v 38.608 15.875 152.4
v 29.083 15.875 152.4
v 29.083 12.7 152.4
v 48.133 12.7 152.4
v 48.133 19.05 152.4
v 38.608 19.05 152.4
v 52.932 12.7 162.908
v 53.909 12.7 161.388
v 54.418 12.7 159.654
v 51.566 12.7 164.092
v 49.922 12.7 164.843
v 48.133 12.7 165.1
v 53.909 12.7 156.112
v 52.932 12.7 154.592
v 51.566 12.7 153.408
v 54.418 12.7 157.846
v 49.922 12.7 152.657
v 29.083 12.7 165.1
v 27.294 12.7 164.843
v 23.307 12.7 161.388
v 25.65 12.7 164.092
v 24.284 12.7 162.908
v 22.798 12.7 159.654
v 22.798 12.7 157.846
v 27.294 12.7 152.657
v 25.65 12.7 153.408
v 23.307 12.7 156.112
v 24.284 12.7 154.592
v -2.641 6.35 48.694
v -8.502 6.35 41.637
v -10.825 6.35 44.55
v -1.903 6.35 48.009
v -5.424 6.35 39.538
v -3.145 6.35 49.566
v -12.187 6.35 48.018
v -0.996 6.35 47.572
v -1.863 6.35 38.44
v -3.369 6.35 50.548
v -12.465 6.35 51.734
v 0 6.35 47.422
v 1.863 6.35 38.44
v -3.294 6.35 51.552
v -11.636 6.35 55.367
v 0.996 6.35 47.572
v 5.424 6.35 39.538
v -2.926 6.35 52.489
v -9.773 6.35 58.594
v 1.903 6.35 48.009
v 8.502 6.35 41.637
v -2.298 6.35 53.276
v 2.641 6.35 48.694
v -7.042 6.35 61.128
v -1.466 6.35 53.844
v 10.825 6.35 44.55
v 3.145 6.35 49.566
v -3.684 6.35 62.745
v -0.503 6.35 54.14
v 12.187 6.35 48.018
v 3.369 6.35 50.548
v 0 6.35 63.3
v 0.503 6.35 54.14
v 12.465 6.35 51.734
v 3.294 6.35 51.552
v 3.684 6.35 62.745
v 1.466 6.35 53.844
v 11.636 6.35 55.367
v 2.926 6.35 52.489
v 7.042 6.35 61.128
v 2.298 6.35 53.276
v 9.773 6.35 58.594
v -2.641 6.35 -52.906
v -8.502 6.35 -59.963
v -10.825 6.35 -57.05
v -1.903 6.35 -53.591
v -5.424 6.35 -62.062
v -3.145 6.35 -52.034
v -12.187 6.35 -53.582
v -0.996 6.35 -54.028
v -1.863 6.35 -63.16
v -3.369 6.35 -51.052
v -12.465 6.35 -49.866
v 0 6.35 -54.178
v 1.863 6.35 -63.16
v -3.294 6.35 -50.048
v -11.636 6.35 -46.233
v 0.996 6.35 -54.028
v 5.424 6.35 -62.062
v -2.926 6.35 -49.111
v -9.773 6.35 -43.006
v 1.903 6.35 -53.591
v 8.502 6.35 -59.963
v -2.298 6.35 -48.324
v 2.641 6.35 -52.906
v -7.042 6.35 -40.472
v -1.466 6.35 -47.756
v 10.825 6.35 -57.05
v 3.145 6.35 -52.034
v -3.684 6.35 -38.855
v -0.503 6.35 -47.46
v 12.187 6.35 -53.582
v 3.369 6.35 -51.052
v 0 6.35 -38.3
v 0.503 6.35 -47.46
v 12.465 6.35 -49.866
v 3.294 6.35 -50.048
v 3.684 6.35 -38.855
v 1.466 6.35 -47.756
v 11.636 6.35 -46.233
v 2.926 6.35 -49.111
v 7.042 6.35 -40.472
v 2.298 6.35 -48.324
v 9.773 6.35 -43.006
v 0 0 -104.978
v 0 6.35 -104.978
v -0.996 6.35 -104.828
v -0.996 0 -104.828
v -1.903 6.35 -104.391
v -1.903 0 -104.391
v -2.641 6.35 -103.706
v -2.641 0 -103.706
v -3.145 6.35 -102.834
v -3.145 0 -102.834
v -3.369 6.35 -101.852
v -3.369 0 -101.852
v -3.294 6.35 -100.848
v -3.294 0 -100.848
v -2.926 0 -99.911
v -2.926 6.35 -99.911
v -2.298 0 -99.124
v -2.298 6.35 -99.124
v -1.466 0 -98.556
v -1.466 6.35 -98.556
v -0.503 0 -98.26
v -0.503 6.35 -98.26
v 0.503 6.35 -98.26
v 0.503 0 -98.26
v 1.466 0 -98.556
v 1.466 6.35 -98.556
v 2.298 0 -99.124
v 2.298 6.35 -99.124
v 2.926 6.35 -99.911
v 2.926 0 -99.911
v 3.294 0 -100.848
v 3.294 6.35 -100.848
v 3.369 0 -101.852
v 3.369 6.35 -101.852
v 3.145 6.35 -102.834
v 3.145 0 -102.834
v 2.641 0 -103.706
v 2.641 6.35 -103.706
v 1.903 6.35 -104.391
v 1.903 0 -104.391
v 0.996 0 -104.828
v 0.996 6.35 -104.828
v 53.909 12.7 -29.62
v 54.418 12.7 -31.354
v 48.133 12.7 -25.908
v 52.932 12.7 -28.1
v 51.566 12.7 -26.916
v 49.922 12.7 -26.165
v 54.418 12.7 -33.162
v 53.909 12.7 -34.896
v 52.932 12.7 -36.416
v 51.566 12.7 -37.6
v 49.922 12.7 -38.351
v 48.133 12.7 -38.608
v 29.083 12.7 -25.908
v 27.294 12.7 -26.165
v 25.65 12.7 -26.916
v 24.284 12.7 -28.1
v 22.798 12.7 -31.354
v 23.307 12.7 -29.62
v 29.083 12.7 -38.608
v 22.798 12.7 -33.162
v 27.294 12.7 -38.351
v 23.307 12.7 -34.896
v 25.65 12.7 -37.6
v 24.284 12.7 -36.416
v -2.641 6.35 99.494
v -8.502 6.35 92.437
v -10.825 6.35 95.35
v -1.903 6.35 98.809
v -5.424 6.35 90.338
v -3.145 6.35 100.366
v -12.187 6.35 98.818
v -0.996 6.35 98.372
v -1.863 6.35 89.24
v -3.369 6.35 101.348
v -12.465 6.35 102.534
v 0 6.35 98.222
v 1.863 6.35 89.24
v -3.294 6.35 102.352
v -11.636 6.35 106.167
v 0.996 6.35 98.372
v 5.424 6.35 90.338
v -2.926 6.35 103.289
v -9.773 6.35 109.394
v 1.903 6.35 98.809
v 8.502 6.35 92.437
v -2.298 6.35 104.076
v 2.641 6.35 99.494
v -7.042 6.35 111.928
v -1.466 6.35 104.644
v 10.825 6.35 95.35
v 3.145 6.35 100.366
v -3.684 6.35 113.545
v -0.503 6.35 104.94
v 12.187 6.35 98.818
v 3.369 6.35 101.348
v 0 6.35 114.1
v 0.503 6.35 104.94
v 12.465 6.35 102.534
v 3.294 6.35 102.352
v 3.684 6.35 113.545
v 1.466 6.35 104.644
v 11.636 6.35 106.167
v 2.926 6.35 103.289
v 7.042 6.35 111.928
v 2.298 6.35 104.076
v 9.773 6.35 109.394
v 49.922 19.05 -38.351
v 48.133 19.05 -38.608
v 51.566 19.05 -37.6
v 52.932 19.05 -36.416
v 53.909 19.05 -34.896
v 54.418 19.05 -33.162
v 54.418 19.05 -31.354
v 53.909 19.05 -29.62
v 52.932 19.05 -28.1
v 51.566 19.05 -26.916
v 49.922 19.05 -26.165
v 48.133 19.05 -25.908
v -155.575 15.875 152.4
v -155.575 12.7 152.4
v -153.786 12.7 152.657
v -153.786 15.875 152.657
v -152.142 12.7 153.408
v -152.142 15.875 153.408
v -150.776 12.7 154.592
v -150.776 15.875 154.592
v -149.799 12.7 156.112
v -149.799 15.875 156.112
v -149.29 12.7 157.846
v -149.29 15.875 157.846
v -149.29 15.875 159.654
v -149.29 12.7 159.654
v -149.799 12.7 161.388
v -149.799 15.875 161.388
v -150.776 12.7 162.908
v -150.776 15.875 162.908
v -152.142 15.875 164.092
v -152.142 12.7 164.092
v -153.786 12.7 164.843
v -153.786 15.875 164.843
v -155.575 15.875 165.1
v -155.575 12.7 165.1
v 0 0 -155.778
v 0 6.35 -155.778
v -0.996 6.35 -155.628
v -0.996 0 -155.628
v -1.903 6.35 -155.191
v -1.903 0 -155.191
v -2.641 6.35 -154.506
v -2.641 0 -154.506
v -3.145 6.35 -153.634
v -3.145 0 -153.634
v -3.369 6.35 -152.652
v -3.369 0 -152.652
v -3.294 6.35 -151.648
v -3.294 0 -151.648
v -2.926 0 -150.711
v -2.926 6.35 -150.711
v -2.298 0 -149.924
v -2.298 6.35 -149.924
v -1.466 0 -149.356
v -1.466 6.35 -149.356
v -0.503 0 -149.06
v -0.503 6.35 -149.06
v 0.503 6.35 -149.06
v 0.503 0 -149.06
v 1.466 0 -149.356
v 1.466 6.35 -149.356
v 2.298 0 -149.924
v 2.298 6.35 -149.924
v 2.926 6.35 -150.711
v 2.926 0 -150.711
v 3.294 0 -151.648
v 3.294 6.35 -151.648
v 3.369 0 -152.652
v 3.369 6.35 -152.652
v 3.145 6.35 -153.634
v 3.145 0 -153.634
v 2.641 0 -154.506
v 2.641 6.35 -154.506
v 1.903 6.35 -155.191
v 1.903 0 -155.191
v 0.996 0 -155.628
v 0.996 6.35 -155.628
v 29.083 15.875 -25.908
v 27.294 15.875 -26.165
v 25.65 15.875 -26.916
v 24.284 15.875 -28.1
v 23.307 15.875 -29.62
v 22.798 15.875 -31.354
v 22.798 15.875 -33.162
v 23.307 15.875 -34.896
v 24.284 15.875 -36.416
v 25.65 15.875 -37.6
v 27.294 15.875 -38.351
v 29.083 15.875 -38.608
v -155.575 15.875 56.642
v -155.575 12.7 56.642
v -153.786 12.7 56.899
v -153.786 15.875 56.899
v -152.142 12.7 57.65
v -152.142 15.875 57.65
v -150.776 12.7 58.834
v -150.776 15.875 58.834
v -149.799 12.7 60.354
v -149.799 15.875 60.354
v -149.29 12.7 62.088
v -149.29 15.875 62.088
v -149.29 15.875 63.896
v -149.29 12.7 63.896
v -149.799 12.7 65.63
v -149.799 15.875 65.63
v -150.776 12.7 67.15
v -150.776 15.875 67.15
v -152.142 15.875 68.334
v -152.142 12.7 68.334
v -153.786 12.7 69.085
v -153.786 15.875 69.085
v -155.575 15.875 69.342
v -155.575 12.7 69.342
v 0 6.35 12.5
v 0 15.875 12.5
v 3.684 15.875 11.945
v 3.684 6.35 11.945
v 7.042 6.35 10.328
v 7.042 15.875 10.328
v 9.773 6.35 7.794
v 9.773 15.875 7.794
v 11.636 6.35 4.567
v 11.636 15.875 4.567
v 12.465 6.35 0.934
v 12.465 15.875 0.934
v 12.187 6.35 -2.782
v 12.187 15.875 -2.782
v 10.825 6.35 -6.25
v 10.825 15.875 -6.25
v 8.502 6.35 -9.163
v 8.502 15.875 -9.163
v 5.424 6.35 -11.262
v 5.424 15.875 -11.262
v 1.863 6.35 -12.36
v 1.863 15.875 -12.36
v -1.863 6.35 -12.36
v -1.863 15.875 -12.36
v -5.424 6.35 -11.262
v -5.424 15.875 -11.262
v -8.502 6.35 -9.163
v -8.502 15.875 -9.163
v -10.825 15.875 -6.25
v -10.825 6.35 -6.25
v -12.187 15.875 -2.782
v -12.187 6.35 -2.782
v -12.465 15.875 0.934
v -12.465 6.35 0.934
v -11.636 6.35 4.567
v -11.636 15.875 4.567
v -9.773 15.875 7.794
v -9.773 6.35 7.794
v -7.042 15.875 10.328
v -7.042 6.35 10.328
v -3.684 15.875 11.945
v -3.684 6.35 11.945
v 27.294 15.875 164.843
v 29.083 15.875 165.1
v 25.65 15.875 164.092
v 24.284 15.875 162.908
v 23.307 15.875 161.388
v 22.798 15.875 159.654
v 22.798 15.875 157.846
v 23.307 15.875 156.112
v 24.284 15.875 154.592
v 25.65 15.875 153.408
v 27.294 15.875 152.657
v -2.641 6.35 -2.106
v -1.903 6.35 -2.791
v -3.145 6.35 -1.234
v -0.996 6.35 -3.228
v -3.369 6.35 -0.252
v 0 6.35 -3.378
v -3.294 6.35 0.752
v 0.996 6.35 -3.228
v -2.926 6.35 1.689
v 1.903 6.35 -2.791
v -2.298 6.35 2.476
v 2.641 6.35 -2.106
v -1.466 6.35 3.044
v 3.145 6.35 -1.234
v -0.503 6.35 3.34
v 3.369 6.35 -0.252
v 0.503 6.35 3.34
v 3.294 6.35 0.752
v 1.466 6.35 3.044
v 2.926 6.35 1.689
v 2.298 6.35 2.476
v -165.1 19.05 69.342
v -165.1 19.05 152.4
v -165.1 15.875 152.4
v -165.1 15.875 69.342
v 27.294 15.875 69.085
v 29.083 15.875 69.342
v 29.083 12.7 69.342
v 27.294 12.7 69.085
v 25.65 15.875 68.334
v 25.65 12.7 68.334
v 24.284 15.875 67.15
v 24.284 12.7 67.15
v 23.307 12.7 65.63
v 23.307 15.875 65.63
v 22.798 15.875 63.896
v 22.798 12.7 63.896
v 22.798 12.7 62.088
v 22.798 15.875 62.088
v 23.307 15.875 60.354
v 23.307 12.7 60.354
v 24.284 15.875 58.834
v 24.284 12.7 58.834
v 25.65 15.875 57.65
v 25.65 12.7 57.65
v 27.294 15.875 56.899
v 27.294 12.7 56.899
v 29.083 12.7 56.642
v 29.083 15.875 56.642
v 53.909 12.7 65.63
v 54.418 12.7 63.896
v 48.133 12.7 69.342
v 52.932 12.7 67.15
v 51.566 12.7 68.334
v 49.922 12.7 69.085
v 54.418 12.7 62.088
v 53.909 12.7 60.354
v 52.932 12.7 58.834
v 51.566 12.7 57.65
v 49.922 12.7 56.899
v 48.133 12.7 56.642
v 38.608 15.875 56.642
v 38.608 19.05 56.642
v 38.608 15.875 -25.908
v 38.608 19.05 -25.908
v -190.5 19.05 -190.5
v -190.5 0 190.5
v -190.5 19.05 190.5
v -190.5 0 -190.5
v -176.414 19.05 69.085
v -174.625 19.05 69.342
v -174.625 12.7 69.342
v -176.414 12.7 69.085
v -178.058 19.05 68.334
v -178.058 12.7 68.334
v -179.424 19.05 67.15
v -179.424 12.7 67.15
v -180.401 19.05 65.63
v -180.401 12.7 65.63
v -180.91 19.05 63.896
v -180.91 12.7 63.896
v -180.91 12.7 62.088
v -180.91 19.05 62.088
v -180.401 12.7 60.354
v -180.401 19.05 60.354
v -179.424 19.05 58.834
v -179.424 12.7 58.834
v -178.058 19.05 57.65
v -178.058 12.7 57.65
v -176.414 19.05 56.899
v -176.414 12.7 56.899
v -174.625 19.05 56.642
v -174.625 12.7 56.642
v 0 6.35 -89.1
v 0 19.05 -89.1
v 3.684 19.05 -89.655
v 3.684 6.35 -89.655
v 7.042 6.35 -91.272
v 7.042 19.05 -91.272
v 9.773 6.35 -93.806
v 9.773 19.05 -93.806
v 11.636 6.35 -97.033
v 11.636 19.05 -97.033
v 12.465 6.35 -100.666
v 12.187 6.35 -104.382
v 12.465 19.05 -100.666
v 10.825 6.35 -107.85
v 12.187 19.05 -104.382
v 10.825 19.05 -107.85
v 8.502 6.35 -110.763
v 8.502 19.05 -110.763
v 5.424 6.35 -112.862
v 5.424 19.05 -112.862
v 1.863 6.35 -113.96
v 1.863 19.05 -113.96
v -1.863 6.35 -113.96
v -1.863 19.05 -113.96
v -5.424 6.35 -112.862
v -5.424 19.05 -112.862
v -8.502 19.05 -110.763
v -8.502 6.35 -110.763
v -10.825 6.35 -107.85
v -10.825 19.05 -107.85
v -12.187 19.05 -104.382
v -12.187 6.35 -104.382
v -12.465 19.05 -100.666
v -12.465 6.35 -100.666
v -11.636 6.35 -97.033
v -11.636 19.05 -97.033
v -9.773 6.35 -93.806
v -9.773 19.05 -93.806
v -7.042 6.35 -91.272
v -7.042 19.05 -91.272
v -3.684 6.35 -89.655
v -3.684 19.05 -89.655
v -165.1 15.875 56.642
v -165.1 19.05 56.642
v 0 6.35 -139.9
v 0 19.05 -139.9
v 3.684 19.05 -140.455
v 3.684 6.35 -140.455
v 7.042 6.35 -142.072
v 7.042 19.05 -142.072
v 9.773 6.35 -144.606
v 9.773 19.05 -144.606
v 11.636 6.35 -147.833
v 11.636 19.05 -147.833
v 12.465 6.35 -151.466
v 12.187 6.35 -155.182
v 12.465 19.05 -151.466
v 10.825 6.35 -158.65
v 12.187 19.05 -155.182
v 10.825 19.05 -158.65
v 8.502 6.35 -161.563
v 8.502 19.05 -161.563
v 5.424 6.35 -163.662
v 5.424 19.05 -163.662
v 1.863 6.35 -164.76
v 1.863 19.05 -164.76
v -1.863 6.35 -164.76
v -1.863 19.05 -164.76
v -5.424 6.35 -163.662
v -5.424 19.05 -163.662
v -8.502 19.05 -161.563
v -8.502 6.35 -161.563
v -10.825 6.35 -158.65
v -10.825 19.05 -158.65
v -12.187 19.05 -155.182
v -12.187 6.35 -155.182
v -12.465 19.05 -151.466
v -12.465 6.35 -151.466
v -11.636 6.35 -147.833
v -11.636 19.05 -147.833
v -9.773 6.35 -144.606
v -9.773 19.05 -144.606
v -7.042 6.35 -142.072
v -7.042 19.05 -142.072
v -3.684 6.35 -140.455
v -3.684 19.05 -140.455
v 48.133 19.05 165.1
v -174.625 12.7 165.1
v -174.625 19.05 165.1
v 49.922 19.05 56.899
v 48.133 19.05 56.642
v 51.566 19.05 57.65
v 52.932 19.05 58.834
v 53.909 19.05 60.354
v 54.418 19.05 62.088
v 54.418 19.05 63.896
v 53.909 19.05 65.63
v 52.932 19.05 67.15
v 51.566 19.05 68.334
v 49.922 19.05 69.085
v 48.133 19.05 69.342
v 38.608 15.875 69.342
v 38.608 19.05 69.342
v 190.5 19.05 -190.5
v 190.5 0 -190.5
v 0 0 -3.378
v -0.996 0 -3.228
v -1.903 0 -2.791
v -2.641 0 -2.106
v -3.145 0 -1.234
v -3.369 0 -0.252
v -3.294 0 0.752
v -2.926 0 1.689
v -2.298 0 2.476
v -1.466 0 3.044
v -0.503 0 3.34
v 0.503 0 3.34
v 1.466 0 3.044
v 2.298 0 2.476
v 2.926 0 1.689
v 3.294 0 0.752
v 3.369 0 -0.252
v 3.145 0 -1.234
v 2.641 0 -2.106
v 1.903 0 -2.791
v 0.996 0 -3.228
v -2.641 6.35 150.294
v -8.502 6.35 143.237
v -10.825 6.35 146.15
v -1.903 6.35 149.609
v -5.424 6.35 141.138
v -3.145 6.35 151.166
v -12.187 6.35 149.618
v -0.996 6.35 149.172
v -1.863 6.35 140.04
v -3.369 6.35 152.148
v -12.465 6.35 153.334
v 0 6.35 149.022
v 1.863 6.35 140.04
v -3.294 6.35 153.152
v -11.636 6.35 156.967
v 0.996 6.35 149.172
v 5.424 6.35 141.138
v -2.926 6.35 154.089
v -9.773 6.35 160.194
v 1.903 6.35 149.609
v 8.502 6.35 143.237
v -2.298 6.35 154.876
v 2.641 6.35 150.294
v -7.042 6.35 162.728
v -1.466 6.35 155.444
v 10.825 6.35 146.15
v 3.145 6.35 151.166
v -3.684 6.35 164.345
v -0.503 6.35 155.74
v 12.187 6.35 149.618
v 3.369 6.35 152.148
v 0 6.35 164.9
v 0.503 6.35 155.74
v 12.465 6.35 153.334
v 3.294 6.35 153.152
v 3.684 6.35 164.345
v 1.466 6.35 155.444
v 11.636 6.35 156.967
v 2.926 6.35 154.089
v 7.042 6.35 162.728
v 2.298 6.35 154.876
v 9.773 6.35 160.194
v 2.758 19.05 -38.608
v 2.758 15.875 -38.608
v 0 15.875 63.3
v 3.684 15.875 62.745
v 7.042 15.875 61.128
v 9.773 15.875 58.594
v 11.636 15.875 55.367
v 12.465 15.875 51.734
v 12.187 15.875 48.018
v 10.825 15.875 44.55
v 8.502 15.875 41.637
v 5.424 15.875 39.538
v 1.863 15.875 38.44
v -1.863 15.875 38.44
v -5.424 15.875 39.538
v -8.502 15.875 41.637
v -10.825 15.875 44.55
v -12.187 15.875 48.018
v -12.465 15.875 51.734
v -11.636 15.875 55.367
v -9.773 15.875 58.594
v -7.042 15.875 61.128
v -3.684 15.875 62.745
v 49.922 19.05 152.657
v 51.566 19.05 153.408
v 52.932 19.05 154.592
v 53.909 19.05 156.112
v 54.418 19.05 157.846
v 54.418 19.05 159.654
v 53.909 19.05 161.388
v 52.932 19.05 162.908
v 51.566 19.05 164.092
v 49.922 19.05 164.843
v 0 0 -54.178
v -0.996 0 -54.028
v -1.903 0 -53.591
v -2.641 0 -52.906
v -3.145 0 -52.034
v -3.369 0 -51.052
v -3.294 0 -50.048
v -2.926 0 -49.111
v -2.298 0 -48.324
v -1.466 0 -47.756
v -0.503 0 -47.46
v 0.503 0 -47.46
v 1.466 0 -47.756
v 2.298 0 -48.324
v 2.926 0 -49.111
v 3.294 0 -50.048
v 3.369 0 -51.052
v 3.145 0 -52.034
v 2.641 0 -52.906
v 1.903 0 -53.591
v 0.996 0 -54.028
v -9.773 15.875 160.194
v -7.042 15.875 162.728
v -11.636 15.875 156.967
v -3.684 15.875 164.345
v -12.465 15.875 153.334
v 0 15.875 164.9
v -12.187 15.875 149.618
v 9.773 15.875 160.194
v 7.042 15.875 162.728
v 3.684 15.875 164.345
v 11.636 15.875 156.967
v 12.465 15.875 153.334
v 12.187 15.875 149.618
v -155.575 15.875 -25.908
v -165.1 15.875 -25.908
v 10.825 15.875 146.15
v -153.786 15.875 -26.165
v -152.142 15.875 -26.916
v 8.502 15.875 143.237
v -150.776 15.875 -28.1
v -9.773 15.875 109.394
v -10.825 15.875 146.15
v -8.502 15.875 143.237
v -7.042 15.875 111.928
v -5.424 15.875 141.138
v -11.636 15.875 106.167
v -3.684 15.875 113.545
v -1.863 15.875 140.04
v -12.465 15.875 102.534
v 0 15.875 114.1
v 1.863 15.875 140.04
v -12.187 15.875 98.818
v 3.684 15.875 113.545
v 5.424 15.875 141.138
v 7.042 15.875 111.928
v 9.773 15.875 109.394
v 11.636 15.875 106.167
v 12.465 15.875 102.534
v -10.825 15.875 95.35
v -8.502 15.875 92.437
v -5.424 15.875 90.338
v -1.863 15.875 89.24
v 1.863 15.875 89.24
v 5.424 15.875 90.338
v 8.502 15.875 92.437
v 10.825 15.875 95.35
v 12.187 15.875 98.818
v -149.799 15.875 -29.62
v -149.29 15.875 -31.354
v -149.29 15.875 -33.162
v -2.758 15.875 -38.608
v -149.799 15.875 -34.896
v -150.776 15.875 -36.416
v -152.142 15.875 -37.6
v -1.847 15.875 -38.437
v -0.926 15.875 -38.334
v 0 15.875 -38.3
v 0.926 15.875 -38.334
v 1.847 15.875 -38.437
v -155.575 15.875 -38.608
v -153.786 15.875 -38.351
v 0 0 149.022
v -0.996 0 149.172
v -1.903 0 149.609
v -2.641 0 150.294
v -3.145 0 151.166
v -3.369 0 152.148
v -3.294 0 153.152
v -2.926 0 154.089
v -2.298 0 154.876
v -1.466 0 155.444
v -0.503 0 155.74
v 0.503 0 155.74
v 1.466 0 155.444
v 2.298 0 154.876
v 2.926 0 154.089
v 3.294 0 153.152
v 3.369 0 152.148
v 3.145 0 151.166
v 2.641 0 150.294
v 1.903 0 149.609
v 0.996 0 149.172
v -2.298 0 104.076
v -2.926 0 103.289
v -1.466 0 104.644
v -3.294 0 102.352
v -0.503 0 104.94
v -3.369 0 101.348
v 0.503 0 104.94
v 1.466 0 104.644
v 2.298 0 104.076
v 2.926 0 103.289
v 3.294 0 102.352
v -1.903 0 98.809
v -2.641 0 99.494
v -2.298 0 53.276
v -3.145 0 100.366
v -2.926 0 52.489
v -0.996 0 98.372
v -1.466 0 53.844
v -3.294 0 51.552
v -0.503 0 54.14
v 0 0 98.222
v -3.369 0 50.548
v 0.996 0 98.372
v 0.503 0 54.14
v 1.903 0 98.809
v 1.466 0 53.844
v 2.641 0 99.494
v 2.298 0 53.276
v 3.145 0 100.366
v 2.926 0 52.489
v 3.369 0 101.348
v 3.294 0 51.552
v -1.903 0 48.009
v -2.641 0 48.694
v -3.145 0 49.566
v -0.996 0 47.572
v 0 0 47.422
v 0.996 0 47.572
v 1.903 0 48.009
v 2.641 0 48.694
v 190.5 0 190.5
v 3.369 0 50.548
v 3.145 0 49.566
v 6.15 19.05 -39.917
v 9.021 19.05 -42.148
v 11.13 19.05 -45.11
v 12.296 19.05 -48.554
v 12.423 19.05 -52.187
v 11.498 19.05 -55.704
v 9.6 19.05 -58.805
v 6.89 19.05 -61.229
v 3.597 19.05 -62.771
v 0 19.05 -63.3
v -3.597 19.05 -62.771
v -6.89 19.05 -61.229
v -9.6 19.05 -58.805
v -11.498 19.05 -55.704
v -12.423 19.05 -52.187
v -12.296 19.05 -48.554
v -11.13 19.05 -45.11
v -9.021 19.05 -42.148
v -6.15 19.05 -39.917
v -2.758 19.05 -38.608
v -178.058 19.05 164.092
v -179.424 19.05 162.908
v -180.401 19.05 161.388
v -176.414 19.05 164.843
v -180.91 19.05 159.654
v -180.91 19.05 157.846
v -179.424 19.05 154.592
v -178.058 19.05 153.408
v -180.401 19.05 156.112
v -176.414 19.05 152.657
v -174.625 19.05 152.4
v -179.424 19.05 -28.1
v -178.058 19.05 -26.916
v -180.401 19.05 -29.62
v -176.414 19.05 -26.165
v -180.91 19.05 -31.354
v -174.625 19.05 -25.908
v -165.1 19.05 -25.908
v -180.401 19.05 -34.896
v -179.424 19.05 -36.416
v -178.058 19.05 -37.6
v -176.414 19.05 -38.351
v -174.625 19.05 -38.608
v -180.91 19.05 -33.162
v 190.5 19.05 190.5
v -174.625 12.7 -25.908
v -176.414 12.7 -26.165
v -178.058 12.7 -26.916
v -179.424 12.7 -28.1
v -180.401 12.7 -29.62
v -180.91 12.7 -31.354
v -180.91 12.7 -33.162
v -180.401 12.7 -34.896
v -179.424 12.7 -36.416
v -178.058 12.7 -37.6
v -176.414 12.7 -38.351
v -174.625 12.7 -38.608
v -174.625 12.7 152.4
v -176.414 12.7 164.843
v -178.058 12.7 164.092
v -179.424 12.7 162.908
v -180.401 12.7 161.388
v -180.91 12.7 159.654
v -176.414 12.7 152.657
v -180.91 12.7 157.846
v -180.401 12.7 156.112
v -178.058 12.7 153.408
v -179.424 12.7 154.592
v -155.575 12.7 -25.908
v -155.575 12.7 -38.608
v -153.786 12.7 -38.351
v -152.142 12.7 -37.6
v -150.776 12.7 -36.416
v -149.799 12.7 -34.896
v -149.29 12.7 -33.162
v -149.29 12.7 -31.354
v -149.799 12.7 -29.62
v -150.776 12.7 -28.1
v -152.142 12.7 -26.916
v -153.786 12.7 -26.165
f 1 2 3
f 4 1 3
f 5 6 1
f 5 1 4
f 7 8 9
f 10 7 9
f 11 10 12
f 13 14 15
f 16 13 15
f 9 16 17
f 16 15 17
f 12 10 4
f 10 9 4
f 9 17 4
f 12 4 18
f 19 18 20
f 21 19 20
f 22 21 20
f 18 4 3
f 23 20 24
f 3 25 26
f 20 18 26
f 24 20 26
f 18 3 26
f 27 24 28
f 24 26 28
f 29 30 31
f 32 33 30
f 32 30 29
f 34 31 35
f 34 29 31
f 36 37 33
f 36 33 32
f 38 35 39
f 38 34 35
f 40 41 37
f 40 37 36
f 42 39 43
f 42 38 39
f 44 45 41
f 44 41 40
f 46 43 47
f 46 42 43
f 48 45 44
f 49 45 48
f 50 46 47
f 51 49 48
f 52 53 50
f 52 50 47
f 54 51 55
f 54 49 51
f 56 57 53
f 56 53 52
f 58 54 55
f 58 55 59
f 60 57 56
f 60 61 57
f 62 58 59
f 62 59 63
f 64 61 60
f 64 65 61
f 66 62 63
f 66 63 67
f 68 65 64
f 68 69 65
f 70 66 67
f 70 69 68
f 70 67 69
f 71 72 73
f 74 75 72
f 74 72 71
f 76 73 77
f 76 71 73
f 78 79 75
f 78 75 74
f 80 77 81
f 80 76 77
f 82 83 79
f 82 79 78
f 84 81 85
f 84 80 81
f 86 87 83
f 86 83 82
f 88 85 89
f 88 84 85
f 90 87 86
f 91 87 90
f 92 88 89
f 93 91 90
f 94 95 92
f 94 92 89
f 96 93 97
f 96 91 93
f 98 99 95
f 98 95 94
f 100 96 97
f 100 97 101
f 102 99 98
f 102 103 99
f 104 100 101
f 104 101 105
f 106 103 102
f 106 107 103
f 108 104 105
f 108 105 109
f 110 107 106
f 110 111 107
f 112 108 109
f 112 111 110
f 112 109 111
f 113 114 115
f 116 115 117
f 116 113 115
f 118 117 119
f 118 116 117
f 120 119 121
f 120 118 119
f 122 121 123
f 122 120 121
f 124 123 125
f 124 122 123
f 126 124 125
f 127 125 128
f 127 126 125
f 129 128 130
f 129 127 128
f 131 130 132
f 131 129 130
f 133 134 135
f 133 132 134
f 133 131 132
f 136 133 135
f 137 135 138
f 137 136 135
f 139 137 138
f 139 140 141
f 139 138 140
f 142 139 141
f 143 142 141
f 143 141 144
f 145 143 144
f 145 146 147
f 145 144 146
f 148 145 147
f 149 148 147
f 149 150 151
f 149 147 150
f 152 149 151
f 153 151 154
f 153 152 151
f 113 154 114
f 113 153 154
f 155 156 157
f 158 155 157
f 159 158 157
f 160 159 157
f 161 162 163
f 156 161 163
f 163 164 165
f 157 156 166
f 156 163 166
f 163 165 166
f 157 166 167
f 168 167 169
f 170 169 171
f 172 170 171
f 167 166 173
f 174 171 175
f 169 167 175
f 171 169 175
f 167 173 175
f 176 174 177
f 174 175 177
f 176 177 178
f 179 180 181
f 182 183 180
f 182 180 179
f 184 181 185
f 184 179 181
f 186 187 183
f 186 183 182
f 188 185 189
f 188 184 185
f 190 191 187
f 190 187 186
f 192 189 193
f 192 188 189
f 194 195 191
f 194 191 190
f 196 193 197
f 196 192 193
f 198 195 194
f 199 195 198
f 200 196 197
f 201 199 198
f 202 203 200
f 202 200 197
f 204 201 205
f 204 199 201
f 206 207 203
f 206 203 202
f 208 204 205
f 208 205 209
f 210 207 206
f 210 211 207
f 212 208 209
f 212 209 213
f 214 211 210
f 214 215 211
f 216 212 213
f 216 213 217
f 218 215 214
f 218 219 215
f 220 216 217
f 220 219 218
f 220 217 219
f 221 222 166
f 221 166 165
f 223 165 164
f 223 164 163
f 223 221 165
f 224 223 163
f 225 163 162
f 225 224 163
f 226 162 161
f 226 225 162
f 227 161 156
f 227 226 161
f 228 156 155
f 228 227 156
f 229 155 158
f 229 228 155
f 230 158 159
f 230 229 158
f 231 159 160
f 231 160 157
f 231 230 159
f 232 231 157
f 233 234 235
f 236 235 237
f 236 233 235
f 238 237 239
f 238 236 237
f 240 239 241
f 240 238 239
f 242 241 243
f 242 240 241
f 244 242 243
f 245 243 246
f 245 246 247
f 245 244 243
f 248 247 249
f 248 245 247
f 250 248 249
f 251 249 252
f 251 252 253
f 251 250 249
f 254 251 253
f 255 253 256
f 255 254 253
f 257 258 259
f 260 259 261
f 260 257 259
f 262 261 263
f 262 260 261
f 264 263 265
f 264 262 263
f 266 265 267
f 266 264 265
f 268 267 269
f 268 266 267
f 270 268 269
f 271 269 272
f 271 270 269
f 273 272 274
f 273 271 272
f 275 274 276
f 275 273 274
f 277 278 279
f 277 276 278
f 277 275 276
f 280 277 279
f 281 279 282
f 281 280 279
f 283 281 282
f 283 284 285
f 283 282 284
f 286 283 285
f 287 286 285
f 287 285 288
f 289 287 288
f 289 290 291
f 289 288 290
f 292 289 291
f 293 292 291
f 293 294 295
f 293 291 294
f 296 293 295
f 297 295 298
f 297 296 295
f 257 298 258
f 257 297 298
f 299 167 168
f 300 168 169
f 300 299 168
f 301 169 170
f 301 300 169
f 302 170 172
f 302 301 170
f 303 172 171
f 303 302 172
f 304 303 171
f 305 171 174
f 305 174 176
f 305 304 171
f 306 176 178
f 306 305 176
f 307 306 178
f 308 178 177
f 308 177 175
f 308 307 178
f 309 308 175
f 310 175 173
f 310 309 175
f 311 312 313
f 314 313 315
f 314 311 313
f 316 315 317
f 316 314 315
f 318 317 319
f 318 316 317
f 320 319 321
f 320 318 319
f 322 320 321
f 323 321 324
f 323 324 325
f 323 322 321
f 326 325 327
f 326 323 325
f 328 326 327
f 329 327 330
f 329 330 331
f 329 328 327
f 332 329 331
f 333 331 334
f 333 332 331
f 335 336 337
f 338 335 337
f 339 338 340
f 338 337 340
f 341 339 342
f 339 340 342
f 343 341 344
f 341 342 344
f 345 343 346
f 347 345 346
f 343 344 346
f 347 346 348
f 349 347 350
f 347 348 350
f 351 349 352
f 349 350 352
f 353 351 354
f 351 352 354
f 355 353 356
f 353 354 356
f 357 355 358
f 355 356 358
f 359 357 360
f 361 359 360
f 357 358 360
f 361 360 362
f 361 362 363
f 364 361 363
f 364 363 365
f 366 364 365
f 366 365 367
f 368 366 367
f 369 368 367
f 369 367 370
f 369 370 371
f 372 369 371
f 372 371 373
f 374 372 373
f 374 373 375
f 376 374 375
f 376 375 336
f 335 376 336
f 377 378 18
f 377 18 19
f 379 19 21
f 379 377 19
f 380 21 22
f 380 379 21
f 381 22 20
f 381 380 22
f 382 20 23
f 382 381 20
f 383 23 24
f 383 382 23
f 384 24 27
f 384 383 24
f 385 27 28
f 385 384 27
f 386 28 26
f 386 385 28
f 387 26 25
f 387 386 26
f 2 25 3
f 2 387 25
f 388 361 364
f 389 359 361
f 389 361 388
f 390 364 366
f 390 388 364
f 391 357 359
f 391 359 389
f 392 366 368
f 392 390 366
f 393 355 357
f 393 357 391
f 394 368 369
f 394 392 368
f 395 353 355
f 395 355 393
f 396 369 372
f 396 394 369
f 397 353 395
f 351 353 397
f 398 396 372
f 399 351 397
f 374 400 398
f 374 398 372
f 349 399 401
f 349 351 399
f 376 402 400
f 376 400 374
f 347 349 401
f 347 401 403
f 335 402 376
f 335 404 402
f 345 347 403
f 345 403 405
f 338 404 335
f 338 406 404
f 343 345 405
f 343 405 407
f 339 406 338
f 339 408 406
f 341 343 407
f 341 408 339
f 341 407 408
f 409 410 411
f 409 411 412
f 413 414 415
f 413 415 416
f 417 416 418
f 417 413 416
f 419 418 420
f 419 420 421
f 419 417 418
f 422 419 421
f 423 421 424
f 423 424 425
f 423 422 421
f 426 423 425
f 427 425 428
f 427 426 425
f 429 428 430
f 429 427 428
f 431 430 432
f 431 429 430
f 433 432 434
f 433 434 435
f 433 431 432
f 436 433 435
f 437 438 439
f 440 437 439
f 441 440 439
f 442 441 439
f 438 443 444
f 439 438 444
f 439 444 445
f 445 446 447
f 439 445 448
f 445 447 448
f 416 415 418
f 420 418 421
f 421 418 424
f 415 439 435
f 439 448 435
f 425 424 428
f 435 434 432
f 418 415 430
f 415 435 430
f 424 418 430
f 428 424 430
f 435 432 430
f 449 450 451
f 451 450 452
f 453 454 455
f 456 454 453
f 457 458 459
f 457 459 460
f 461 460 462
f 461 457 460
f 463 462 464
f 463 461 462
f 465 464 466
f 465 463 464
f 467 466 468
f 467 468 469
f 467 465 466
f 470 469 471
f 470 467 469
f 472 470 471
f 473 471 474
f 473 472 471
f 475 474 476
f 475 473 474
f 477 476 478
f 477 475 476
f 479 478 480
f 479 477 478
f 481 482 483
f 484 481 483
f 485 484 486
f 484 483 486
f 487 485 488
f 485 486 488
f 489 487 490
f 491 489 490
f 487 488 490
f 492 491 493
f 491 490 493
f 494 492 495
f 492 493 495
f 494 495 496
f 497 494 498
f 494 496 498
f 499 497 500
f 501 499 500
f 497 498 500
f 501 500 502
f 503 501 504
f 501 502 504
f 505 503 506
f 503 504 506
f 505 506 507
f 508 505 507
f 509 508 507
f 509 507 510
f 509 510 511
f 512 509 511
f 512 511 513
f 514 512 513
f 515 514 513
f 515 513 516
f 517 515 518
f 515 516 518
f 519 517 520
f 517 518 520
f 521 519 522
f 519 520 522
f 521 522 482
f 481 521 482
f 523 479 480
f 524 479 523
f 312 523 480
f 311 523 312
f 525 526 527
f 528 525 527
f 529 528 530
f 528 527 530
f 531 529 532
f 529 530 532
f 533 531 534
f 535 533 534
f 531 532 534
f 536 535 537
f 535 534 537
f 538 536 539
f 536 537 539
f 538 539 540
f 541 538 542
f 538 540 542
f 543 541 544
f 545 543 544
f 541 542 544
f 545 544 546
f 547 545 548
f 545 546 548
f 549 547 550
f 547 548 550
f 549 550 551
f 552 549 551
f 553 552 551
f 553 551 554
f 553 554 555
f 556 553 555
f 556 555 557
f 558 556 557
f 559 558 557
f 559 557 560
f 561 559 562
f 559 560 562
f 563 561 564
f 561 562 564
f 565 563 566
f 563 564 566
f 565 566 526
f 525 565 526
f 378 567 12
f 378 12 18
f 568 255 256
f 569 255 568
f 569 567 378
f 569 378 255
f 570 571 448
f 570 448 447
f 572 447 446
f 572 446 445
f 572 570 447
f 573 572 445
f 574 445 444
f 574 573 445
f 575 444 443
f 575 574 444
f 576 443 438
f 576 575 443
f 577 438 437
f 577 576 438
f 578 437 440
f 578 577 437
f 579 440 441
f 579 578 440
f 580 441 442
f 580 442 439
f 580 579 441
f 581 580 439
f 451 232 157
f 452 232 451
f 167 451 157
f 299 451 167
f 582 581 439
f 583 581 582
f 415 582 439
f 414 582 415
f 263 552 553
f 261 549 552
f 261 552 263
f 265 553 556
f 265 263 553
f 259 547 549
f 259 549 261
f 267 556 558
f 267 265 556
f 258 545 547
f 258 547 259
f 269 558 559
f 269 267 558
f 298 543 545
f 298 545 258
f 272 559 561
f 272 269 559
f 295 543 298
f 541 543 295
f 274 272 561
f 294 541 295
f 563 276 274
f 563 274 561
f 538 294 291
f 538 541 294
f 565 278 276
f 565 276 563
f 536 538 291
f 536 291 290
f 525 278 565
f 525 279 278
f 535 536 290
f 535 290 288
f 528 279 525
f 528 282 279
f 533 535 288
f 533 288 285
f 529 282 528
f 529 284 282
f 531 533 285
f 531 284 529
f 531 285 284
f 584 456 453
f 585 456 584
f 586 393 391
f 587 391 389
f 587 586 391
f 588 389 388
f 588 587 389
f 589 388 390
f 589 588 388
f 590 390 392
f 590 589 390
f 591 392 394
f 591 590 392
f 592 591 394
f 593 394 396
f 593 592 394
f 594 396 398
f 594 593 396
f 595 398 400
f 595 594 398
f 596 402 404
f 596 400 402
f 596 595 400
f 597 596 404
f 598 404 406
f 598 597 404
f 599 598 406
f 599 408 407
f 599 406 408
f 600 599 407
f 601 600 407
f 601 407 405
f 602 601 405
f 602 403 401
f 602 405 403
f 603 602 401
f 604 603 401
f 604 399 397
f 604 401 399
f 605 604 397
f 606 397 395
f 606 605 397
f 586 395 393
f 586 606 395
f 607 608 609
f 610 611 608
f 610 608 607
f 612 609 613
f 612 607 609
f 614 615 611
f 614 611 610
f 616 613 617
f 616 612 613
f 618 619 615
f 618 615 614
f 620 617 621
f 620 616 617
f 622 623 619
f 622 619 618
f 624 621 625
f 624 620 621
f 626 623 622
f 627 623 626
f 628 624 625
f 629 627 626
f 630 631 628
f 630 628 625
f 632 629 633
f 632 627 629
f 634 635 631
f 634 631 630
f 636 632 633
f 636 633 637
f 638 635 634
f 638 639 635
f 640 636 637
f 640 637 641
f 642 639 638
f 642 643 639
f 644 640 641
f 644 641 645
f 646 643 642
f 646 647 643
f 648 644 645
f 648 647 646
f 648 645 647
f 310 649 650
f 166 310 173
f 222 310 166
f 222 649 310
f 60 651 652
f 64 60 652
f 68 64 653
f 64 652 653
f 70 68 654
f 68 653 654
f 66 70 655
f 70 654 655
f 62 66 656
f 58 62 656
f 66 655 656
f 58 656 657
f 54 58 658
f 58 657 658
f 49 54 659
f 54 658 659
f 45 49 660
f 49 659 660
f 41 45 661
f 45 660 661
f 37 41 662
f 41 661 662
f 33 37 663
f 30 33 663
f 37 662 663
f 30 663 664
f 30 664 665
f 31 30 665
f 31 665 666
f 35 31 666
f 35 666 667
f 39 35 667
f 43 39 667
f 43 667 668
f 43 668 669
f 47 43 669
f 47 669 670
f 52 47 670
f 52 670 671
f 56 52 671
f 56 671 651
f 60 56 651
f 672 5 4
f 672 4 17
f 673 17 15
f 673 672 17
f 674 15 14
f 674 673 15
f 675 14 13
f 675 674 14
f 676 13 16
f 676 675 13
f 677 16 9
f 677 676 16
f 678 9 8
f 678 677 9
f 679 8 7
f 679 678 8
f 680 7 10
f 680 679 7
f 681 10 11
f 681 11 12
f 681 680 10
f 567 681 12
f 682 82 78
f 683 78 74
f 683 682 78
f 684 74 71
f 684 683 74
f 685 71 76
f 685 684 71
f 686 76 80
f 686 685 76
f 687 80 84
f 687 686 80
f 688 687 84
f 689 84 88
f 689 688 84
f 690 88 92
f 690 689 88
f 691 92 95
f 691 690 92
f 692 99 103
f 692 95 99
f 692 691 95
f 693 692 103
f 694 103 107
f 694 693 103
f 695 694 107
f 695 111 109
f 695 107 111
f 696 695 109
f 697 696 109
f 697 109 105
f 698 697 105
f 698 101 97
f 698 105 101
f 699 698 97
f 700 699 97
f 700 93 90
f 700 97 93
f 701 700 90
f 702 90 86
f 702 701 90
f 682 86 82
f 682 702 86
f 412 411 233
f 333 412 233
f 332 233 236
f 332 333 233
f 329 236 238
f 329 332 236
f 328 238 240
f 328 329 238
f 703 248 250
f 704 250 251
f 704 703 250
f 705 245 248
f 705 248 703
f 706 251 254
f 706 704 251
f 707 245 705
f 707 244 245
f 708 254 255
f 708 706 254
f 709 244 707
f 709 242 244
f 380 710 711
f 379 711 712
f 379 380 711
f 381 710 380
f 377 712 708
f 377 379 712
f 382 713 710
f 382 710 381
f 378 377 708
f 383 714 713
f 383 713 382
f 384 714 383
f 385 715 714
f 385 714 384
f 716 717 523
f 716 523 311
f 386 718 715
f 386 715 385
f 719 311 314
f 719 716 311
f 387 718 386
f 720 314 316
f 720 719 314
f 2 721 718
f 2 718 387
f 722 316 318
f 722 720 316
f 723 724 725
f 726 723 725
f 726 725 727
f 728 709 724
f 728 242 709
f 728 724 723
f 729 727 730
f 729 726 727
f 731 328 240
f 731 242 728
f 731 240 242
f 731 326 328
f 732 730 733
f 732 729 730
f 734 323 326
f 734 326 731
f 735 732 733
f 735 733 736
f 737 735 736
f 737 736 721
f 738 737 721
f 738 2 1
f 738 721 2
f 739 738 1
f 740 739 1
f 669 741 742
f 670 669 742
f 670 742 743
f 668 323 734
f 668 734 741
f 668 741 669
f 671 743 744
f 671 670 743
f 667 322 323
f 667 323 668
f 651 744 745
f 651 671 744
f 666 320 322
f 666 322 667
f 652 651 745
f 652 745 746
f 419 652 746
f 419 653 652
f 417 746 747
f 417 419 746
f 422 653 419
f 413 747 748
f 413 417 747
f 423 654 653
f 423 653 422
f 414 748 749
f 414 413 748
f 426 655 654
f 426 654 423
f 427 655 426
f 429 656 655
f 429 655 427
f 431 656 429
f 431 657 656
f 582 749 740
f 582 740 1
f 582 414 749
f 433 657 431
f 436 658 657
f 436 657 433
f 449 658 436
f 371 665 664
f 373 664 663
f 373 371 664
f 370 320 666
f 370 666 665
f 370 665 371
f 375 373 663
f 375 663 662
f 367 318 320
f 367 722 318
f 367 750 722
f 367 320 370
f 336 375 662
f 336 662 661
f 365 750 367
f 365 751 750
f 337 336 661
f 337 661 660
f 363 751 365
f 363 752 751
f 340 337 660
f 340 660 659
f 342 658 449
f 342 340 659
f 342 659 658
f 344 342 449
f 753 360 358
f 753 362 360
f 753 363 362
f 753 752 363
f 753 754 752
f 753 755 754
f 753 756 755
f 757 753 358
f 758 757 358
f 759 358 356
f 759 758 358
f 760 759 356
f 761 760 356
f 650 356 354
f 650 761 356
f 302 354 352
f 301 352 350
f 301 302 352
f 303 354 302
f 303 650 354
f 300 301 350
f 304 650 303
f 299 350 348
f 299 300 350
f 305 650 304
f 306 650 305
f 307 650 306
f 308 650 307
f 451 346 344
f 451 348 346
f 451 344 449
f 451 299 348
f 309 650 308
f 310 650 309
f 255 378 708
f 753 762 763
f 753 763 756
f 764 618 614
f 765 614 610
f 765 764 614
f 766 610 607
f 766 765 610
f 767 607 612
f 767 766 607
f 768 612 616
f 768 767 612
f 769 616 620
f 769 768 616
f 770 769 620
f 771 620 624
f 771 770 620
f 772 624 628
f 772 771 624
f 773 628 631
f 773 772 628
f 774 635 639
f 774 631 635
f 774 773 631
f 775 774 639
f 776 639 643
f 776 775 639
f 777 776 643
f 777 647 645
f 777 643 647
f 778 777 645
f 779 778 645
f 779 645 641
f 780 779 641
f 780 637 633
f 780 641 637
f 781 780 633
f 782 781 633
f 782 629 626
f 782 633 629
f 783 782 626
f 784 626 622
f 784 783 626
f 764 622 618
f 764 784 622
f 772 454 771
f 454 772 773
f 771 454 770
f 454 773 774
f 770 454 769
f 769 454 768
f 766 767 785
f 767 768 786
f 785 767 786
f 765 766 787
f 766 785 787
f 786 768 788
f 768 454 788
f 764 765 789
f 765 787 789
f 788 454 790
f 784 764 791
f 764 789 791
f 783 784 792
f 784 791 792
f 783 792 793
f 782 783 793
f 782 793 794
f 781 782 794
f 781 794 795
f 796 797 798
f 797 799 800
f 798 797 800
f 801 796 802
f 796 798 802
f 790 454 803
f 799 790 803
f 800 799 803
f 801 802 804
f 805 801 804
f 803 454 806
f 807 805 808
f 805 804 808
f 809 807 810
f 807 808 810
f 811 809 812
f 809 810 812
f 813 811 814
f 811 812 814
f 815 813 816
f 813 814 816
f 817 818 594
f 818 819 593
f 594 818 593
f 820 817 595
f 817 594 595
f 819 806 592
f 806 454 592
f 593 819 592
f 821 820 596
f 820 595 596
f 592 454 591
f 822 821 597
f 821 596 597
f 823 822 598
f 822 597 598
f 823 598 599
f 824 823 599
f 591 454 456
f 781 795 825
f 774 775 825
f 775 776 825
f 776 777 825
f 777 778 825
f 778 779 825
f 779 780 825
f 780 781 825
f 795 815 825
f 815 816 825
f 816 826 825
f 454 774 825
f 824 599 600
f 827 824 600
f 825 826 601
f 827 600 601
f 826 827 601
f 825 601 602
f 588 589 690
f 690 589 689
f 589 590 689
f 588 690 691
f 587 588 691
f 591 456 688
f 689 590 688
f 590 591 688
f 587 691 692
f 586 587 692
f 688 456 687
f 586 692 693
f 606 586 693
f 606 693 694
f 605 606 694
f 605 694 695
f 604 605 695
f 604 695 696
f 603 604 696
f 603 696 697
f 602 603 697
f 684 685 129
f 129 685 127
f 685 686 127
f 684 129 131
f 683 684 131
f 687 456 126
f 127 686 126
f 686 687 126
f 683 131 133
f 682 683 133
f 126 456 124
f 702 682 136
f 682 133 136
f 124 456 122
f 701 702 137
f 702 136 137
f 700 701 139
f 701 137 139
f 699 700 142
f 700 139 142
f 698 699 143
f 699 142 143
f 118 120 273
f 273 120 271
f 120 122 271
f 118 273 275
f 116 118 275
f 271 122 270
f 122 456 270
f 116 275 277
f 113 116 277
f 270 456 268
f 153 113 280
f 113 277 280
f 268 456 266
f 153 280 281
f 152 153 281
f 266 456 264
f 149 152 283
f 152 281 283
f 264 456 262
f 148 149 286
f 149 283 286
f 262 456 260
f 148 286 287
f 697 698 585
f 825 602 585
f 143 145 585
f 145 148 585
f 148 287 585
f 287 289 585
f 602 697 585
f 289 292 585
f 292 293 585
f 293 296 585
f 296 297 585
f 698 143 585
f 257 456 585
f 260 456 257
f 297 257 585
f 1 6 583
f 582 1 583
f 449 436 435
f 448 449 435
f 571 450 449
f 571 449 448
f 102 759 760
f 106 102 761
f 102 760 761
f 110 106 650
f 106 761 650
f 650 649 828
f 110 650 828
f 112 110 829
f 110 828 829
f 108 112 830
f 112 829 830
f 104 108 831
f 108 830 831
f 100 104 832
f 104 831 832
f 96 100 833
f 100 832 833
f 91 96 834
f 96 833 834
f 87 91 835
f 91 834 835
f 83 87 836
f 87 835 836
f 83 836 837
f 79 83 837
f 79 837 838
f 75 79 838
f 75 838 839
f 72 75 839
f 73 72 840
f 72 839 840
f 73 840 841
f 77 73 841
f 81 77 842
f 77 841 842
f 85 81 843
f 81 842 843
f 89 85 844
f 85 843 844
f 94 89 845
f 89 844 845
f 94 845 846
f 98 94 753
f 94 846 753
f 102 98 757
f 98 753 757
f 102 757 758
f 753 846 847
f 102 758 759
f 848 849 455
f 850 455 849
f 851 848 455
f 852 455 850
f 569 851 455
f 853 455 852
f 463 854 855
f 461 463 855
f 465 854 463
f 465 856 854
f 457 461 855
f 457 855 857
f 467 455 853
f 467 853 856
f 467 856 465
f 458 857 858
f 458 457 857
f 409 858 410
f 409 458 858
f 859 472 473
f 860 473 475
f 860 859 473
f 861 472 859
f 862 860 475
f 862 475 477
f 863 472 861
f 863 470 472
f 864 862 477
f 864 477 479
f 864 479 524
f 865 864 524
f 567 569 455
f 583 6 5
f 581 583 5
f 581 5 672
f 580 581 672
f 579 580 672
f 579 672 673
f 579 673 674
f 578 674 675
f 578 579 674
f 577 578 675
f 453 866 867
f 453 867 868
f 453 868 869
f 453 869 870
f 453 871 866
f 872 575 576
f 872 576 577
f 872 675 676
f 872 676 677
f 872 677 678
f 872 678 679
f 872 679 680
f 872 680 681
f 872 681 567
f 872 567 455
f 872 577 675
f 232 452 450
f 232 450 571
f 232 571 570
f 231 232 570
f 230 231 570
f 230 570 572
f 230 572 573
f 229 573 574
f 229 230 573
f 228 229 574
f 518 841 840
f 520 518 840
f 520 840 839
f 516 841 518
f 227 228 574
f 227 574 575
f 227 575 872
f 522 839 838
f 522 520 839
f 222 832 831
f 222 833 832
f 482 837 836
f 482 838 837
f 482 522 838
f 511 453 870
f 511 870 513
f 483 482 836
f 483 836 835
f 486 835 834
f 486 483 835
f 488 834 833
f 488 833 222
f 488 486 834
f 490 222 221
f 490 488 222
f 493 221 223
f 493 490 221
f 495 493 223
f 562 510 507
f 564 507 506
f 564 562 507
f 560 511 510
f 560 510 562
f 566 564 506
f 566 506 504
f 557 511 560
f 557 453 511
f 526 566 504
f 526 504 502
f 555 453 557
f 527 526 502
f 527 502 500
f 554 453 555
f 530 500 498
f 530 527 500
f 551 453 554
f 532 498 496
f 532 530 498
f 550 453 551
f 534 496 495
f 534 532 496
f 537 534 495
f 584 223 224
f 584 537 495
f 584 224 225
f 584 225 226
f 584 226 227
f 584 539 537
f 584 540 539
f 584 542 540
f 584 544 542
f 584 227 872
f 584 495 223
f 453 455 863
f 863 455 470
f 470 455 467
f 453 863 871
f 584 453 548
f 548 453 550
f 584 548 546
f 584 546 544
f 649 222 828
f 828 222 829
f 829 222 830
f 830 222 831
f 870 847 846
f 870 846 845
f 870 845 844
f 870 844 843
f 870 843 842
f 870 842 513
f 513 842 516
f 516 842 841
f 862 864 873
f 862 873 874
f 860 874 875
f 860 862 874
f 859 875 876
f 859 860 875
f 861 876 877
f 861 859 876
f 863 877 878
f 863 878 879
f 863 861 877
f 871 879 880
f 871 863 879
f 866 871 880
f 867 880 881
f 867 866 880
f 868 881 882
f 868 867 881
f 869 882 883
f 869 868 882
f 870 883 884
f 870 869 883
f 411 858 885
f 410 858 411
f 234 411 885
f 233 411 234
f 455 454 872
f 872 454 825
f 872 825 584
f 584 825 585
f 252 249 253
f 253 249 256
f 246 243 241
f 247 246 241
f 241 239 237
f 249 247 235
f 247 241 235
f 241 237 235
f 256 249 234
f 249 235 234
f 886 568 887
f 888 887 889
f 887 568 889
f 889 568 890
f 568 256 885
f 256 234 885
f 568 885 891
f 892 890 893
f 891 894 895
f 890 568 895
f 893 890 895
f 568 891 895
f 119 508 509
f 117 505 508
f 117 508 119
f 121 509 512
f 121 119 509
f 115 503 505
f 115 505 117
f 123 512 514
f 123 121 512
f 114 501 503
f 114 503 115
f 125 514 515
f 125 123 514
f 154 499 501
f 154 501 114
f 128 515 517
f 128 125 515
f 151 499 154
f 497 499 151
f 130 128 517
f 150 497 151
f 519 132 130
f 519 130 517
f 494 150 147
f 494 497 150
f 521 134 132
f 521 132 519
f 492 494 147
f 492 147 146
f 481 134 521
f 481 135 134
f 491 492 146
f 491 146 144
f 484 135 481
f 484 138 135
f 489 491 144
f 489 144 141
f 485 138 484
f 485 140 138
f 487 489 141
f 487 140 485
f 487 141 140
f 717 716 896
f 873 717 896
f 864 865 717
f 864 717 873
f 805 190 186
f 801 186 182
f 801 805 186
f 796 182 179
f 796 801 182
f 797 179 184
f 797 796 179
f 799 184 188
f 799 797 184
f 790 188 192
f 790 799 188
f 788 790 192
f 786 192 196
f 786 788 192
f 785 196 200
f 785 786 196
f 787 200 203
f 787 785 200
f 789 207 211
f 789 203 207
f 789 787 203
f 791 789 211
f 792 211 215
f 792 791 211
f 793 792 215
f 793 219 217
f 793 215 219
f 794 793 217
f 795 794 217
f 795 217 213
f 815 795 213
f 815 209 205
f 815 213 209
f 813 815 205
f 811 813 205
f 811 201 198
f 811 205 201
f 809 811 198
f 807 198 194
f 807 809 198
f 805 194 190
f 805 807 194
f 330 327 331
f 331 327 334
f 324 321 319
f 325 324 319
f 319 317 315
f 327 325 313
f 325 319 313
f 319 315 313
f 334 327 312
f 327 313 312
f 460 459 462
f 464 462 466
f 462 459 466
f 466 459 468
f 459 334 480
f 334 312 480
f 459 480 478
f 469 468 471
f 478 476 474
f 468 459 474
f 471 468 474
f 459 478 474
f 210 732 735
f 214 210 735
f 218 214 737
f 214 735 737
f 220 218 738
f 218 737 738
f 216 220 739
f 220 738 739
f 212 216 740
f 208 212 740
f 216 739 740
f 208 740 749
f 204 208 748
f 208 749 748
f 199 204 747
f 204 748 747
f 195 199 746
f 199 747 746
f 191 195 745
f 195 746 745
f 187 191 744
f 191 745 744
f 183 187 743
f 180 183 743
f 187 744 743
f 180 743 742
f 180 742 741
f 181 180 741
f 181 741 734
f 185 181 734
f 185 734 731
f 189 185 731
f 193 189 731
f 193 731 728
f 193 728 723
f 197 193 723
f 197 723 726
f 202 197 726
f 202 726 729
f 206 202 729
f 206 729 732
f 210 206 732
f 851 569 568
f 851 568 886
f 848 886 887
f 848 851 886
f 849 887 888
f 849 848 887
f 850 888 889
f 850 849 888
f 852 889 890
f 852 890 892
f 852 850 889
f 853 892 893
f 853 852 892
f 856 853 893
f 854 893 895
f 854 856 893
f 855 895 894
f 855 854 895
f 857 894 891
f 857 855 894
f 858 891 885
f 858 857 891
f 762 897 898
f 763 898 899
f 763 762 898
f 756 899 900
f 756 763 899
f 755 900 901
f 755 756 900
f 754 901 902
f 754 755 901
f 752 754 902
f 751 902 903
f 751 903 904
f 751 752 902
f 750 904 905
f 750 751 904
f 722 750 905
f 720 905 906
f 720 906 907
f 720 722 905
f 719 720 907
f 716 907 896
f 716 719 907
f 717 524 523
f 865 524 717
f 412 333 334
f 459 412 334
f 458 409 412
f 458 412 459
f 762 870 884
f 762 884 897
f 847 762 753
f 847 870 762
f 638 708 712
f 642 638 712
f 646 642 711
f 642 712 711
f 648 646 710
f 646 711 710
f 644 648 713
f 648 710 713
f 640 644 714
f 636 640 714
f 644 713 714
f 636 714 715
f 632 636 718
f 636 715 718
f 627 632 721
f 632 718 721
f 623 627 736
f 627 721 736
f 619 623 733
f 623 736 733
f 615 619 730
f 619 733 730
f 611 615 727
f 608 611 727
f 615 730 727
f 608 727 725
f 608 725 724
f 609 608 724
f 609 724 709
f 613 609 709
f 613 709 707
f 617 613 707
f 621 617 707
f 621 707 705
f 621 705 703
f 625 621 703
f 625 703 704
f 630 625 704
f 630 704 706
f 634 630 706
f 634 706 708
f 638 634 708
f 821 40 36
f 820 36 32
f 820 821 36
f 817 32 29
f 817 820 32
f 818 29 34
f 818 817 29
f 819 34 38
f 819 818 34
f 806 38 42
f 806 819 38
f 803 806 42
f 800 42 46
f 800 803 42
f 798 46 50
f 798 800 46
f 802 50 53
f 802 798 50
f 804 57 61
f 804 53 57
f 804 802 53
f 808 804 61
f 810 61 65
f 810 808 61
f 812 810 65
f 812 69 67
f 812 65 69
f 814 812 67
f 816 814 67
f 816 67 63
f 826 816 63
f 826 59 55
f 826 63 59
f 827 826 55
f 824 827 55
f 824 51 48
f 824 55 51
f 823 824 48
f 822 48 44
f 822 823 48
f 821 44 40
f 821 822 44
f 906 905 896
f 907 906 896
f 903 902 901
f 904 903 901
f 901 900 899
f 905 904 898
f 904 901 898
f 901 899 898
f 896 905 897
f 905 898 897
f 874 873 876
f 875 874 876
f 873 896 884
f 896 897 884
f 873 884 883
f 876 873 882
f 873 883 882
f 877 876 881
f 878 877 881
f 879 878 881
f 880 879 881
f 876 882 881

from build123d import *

# Parameters (mm, degrees)
SKETCH2_W         = 381
SKETCH2_H         = 381
SKETCH2_R         = 3.3782
BOLT_HOLES_DEPTH  = 19.05
SKETCH3_R         = 12.5
COUNTERBORE_DEPTH = 12.7
SKETCH4_W         = 203.708
SKETCH4_H         = 203.708
AL_POCKET_DEPTH   = 3.175
RELIEF_DEPTH      = 6.35


with BuildPart() as part:
    # Sketch2 → Bolt Holes (new body)
    with BuildSketch(Plane(origin=(0, 0, 0), x_dir=(1, 0, 0), z_dir=(0, 1, 0))):
        Rectangle(SKETCH2_W, SKETCH2_H)
        with Locations(Location((0, 0, 0), (0, 0, 90))):
            Circle(SKETCH2_R, mode=Mode.SUBTRACT)
        with Locations(Location((0, 50.8, 0), (0, 0, 90))):
            Circle(SKETCH2_R, mode=Mode.SUBTRACT)
        with Locations(Location((0, 101.6, 0), (0, 0, 90))):
            Circle(SKETCH2_R, mode=Mode.SUBTRACT)
        with Locations(Location((0, 152.4, 0), (0, 0, 90))):
            Circle(SKETCH2_R, mode=Mode.SUBTRACT)
        with Locations(Location((0, -50.8, 0), (0, 0, 90))):
            Circle(SKETCH2_R, mode=Mode.SUBTRACT)
        with Locations(Location((0, -101.6, 0), (0, 0, 90))):
            Circle(SKETCH2_R, mode=Mode.SUBTRACT)
        with Locations(Location((0, -152.4, 0), (0, 0, 90))):
            Circle(SKETCH2_R, mode=Mode.SUBTRACT)
    extrude(amount=BOLT_HOLES_DEPTH)

    # Sketch3 → Counterbore (cut)
    with BuildSketch(Plane(origin=(0, 19.05, 0), x_dir=(1, 0, 0), z_dir=(0, 1, 0))):
        with Locations(Location((0, -50.8, 0), (0, 0, 270))):
            Circle(SKETCH3_R)
        with Locations(Location((0, 0, 0), (0, 0, 270))):
            Circle(SKETCH3_R)
        with Locations(Location((0, -101.6, 0), (0, 0, 270))):
            Circle(SKETCH3_R)
        with Locations(Location((0, 50.8, 0), (0, 0, 270))):
            Circle(SKETCH3_R)
        with Locations(Location((0, 101.6, 0), (0, 0, 270))):
            Circle(SKETCH3_R)
        with Locations(Location((0, 152.4, 0), (0, 0, 270))):
            Circle(SKETCH3_R)
        with Locations(Location((0, -152.4, 0), (0, 0, 270))):
            Circle(SKETCH3_R)
    extrude(amount=-COUNTERBORE_DEPTH, mode=Mode.SUBTRACT)

    # Sketch4 → al_pocket (cut)
    with BuildSketch(Plane(origin=(0, 19.05, 0), x_dir=(1, 0, 0), z_dir=(0, 1, 0))):
        with Locations((-63.246, -63.246)):
            Rectangle(SKETCH4_W, SKETCH4_H)
    extrude(amount=-AL_POCKET_DEPTH, mode=Mode.SUBTRACT)

    # Sketch5 → Relief (cut)
    with BuildSketch(Plane(origin=(0, 19.05, 0), x_dir=(1, 0, 0), z_dir=(0, 1, 0))):
        with BuildLine():
            Line((-174.625, 38.608), (-155.575, 38.608))
            ThreePointArc((-155.575, 38.608), (-149.225, 32.258), (-155.575, 25.908))
            Line((-155.575, 25.908), (-174.625, 25.908))
            ThreePointArc((-174.625, 25.908), (-180.975, 32.258), (-174.625, 38.608))
        make_face()
        with BuildLine():
            Line((-174.625, -152.4), (-155.575, -152.4))
            ThreePointArc((-155.575, -152.4), (-149.225, -158.75), (-155.575, -165.1))
            Line((-155.575, -165.1), (-174.625, -165.1))
            ThreePointArc((-174.625, -165.1), (-180.975, -158.75), (-174.625, -152.4))
        make_face()
        with BuildLine():
            Line((-174.625, -56.642), (-155.575, -56.642))
            ThreePointArc((-155.575, -56.642), (-149.225, -62.992), (-155.575, -69.342))
            Line((-155.575, -69.342), (-174.625, -69.342))
            ThreePointArc((-174.625, -69.342), (-180.975, -62.992), (-174.625, -56.642))
        make_face()
        with BuildLine():
            Line((29.083, 38.608), (48.133, 38.608))
            ThreePointArc((48.133, 38.608), (54.483, 32.258), (48.133, 25.908))
            Line((48.133, 25.908), (29.083, 25.908))
            ThreePointArc((29.083, 25.908), (22.733, 32.258), (29.083, 38.608))
        make_face()
        with BuildLine():
            Line((29.083, -152.4), (48.133, -152.4))
            ThreePointArc((48.133, -152.4), (54.483, -158.75), (48.133, -165.1))
            Line((48.133, -165.1), (29.083, -165.1))
            ThreePointArc((29.083, -165.1), (22.733, -158.75), (29.083, -152.4))
        make_face()
        with BuildLine():
            Line((29.083, -56.642), (48.133, -56.642))
            ThreePointArc((48.133, -56.642), (54.483, -62.992), (48.133, -69.342))
            Line((48.133, -69.342), (29.083, -69.342))
            ThreePointArc((29.083, -69.342), (22.733, -62.992), (29.083, -56.642))
        make_face()
    extrude(amount=-RELIEF_DEPTH, mode=Mode.SUBTRACT)


solid = part.part
